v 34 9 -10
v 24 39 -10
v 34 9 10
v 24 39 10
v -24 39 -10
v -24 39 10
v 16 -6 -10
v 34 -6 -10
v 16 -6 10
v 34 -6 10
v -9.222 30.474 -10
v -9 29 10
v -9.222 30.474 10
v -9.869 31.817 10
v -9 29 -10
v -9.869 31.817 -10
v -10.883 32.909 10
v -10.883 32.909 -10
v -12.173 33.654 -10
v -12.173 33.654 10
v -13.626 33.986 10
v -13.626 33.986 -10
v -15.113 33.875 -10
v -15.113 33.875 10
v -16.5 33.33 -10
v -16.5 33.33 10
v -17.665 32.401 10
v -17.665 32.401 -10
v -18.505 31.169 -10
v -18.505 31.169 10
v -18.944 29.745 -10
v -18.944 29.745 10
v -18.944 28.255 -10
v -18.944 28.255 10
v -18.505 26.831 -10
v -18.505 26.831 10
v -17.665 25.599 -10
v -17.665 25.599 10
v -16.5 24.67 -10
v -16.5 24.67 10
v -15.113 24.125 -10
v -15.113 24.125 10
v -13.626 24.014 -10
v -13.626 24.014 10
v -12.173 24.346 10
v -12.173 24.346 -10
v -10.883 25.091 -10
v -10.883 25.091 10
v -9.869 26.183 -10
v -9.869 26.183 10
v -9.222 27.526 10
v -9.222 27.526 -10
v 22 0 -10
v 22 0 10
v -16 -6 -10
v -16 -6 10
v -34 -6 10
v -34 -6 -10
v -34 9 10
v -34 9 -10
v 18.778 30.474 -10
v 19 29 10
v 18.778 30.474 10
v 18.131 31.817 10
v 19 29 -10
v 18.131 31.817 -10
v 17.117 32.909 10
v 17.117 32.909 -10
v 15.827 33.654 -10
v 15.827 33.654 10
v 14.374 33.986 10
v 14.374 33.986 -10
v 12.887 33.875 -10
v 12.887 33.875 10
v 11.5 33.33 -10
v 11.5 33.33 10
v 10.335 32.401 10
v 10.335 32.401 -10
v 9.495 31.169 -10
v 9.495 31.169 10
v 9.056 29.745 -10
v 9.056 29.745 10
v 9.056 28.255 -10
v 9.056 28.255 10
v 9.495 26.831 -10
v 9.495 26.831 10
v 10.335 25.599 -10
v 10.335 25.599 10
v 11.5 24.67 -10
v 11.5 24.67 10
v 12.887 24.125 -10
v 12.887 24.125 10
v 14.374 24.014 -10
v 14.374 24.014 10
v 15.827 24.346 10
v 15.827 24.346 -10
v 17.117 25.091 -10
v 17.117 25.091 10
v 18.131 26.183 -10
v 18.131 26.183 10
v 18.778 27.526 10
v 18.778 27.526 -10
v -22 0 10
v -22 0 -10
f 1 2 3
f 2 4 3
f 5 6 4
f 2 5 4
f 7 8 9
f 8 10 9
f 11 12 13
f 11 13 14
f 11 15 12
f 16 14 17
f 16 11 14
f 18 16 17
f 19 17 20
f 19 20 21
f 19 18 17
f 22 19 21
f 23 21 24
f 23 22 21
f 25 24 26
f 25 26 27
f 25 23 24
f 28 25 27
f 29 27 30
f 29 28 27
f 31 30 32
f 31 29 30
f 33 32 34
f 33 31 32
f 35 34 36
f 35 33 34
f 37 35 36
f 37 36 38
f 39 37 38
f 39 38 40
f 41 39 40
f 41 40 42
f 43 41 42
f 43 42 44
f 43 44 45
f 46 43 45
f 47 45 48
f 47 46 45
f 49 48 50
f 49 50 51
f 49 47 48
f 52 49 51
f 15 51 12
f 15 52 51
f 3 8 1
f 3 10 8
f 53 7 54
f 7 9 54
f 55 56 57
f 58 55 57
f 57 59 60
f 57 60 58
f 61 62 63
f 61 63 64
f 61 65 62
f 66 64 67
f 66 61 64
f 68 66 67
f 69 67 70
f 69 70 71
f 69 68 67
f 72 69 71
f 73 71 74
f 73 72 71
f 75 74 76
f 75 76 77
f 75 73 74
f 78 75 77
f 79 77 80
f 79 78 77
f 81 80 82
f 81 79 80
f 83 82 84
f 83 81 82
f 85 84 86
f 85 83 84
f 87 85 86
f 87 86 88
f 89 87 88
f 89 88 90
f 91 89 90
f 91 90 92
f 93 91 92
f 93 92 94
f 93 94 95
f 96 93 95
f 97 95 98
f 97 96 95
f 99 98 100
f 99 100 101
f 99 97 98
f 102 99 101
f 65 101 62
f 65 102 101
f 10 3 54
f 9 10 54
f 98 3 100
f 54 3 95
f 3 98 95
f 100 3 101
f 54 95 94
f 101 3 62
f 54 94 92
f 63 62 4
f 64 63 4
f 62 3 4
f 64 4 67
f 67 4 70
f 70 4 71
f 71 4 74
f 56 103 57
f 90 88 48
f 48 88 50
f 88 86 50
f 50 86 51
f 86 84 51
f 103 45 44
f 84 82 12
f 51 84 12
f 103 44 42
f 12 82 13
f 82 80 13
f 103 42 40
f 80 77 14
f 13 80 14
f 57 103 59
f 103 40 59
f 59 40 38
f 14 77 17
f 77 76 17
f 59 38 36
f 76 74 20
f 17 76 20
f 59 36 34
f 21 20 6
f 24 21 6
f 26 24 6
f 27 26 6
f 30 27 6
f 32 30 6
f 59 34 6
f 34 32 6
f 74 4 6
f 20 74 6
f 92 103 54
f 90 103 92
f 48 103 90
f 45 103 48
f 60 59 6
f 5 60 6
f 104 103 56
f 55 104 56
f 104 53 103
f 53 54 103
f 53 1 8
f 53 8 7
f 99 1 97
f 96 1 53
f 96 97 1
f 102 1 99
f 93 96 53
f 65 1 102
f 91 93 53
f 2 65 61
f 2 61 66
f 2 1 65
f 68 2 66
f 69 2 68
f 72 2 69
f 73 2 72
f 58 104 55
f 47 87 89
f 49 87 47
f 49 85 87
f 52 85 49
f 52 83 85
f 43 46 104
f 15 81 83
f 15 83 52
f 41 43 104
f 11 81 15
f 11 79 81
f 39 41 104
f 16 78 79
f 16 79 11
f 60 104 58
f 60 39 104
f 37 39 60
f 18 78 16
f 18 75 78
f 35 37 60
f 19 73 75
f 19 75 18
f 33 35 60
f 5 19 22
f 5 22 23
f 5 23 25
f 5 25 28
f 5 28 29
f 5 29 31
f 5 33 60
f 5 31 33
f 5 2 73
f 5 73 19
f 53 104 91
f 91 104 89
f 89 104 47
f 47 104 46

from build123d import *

# Parameters (mm, degrees)
SKETCH1_R           = 5
BOSS_EXTRUDE1_DEPTH = 10


with BuildPart() as part:
    # Sketch1 → Boss-Extrude1 (new, symmetric)
    with BuildSketch(Plane.XY):
        Polygon((-24, 39), (24, 39), (34, 9), (34, 0), (34, -6), (16, -6), (22, 0), (-22, 0), (-16, -6), (-34, -6), (-34, 0), (-34, 9), align=None)
        with Locations((-14, 29)):
            Circle(SKETCH1_R, mode=Mode.SUBTRACT)
        with Locations((14, 29)):
            Circle(SKETCH1_R, mode=Mode.SUBTRACT)
    extrude(amount=BOSS_EXTRUDE1_DEPTH, both=True)


solid = part.part
